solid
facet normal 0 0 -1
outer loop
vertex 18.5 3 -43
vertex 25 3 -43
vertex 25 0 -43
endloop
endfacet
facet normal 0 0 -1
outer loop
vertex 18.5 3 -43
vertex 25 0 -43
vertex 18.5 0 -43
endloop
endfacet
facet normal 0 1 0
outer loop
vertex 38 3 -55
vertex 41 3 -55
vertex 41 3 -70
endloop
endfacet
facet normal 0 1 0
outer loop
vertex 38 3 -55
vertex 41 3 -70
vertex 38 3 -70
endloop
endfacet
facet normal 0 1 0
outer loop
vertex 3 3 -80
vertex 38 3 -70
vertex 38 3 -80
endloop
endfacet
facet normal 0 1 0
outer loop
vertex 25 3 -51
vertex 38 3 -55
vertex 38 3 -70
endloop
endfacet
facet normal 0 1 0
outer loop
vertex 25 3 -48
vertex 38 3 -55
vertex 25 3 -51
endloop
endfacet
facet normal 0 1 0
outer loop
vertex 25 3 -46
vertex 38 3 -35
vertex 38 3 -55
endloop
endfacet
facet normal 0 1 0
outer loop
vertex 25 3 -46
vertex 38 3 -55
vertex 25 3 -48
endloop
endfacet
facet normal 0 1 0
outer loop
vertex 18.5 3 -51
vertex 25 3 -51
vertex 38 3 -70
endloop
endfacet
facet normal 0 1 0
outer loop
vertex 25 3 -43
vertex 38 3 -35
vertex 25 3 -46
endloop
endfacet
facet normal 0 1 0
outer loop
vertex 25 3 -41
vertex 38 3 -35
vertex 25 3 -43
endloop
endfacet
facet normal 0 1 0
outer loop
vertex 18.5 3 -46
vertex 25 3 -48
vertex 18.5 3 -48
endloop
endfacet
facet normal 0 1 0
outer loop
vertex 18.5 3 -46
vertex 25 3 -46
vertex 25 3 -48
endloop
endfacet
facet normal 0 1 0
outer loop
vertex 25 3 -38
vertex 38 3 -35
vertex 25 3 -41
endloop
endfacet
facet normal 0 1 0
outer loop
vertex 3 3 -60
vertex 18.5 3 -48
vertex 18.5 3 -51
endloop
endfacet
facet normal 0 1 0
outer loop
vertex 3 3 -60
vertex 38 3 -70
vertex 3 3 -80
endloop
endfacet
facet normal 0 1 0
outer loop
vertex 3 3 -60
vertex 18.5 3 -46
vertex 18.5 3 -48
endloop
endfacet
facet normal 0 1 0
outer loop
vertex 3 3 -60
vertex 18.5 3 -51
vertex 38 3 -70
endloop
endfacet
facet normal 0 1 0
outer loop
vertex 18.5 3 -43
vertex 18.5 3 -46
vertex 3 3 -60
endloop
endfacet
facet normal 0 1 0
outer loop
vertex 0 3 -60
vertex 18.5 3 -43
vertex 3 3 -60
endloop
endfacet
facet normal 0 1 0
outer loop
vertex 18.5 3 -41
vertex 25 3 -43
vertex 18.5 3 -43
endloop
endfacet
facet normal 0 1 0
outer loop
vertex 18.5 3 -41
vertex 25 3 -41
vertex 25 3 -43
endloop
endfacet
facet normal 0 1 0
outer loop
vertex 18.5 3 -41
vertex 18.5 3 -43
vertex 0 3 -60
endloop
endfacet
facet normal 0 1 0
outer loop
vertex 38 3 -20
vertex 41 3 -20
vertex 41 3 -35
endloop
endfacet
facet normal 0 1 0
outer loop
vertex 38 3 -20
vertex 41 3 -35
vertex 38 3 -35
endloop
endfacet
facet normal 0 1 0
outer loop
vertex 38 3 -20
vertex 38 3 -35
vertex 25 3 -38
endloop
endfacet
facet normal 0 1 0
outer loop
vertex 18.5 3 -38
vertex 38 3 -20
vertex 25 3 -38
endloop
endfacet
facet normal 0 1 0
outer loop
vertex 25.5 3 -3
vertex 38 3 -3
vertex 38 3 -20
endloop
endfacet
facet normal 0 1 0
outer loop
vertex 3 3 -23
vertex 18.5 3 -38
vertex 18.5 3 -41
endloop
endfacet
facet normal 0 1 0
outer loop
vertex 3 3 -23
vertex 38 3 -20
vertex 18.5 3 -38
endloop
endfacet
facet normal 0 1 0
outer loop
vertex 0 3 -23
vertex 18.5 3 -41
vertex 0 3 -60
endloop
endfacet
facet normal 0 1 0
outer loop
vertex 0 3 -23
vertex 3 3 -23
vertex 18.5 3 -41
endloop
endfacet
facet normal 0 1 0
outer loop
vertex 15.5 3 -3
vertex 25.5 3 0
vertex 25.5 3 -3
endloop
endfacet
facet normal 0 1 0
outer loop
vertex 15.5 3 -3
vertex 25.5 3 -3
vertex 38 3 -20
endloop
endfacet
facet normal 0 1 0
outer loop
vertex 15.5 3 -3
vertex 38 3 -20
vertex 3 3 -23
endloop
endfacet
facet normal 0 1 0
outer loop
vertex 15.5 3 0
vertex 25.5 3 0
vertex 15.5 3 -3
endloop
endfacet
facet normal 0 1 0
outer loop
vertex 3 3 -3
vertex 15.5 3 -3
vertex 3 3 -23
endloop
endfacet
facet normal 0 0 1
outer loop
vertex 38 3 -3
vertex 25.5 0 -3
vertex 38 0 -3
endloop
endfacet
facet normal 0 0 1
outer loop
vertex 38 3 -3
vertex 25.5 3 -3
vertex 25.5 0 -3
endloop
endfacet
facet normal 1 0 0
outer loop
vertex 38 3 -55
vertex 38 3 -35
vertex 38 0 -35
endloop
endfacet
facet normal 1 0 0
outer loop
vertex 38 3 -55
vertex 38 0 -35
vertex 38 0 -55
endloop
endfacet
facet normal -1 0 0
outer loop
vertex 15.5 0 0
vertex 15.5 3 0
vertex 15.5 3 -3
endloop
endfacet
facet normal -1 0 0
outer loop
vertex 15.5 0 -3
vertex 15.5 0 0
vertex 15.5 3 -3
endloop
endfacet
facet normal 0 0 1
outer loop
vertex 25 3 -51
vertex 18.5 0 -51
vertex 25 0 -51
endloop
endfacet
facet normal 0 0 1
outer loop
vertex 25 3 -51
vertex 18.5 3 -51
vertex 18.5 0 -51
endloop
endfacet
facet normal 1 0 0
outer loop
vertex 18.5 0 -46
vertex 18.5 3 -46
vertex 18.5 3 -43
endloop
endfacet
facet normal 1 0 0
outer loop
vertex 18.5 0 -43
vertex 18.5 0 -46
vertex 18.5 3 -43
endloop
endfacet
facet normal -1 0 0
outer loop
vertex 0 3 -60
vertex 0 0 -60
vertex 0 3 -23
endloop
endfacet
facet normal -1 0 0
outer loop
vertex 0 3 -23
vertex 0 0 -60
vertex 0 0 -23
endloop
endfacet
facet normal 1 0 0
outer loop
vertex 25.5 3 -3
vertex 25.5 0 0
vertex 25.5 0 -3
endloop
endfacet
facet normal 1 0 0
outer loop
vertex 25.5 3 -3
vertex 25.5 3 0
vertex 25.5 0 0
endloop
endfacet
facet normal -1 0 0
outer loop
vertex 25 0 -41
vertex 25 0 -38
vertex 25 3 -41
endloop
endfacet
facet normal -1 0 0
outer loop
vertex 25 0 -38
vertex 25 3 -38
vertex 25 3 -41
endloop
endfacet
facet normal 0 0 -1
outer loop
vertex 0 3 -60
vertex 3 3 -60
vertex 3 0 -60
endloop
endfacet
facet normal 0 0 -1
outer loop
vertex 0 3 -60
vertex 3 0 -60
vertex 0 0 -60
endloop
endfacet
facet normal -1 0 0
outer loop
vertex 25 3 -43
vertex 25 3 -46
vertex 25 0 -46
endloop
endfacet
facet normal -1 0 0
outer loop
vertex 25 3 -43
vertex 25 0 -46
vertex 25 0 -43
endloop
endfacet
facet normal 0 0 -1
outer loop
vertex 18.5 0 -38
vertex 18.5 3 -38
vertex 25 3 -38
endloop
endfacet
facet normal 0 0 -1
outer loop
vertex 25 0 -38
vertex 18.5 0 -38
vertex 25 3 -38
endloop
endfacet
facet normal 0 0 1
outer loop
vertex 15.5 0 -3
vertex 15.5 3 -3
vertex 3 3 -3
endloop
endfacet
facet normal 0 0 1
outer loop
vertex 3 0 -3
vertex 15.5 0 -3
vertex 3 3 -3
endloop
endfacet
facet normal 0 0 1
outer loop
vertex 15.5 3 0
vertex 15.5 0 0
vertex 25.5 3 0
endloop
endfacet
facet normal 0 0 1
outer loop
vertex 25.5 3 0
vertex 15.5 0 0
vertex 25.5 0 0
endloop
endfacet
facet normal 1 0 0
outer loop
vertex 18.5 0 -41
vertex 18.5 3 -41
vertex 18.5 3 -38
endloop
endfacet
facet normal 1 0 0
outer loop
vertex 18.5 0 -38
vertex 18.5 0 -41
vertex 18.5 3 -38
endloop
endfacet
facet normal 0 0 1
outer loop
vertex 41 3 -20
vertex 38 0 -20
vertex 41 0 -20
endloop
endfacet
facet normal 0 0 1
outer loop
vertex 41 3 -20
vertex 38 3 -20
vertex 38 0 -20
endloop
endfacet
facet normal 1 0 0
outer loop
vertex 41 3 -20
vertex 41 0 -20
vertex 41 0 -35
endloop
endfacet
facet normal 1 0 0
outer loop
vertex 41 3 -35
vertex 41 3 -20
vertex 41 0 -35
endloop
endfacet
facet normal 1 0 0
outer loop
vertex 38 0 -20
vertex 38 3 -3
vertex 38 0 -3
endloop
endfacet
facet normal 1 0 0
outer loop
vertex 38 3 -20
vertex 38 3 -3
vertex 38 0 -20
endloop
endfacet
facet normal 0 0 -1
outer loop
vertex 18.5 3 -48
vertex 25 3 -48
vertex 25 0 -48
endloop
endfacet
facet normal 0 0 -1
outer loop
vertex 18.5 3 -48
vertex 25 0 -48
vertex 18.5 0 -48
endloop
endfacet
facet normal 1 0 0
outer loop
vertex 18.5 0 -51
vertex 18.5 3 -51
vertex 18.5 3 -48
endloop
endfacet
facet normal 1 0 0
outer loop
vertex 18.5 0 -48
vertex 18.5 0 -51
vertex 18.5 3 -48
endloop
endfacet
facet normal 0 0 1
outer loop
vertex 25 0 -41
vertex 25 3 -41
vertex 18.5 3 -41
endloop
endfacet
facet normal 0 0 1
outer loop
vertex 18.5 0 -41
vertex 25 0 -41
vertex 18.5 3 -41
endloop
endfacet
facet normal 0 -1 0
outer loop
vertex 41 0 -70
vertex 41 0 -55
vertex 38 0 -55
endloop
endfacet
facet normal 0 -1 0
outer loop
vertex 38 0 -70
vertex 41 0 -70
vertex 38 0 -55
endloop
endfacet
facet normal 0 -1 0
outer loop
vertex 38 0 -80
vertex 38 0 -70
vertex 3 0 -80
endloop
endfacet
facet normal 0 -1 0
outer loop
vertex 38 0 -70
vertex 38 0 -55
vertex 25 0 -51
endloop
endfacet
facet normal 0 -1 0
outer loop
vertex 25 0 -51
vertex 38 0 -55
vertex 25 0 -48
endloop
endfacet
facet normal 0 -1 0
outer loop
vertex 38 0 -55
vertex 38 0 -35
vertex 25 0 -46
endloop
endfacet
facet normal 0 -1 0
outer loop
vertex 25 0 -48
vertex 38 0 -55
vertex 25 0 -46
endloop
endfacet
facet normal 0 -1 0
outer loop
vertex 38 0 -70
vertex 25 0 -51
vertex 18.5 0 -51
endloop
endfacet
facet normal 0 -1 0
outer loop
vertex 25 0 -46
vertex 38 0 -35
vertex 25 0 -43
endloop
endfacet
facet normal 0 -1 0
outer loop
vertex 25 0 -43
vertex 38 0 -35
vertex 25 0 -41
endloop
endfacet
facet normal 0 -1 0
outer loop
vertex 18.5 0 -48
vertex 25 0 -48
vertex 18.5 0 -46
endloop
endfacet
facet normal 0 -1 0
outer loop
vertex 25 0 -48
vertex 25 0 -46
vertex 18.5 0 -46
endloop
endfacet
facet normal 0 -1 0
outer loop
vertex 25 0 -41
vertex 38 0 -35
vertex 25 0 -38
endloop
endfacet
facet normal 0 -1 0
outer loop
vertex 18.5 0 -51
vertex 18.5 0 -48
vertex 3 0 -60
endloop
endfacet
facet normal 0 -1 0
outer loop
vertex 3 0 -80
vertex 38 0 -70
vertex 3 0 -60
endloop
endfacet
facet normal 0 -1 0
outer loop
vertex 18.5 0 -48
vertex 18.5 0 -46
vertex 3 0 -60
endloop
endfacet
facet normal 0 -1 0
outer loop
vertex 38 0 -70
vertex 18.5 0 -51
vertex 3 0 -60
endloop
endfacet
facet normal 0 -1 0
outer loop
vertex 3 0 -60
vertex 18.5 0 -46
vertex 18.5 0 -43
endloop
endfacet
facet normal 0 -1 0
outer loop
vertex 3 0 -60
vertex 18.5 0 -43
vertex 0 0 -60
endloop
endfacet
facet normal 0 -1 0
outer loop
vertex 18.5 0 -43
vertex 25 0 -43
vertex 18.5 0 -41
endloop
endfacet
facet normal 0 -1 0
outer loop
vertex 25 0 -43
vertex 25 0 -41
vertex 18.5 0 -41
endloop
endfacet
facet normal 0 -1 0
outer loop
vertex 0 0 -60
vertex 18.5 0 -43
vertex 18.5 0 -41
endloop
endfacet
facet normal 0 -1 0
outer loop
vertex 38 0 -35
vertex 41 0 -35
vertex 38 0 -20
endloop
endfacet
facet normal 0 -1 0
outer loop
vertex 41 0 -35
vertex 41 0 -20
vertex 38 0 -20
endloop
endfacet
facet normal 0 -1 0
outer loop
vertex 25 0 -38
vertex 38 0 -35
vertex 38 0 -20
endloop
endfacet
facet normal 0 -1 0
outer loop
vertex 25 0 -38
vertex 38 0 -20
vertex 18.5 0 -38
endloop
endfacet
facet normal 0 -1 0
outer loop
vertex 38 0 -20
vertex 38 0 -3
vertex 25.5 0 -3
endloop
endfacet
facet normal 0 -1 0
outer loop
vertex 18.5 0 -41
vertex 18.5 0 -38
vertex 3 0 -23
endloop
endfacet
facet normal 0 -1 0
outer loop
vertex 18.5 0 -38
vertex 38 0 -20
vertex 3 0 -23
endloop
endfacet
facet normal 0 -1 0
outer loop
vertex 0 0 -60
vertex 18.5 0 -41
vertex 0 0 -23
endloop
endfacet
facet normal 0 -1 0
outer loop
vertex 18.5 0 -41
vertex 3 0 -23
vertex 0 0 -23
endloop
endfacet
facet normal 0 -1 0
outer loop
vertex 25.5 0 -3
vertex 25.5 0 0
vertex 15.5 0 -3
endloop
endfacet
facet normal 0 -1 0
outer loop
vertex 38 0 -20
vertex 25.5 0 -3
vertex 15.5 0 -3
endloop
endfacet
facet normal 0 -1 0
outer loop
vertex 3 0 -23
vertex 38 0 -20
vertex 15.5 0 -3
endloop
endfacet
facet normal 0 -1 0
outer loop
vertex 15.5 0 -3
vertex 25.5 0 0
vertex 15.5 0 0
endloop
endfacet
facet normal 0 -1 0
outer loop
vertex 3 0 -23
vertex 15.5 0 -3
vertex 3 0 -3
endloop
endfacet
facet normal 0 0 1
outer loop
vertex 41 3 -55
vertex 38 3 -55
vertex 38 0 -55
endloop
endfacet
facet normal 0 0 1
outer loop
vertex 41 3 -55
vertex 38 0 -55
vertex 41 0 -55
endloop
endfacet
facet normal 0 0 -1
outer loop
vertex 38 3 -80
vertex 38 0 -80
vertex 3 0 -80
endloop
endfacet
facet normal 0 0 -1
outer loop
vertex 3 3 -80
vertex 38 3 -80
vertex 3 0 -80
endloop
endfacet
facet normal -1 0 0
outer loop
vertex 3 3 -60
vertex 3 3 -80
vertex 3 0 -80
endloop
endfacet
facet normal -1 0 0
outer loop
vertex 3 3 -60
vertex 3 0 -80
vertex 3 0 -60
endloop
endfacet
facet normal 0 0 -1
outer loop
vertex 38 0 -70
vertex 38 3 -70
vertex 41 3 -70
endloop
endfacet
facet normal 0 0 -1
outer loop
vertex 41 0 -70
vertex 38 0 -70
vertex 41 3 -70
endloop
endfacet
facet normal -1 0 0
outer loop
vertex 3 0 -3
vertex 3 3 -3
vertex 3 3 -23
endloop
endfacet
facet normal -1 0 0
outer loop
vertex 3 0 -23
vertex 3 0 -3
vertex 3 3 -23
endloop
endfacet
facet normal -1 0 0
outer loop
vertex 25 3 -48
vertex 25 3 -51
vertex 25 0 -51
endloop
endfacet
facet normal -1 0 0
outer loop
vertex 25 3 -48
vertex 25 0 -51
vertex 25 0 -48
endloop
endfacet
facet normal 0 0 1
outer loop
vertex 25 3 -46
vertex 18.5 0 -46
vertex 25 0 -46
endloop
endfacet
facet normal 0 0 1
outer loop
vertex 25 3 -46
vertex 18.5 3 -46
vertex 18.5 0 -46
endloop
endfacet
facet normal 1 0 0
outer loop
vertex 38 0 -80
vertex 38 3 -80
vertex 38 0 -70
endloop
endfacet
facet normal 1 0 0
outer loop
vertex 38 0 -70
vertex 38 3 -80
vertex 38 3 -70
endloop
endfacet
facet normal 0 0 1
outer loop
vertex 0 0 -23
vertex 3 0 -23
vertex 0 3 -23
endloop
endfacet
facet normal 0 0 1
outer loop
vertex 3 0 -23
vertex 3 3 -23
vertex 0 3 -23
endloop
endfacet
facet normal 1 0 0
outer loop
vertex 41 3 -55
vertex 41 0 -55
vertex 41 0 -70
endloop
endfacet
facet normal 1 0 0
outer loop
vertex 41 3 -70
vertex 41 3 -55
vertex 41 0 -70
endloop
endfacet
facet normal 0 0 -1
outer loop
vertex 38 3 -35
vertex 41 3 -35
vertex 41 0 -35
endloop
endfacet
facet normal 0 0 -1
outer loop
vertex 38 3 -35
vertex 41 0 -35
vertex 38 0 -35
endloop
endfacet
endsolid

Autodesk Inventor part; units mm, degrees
ref_plane "YZ Plane" through (0, 0, 0) normal (1, 0, 0) x (0, 1, 0)
ref_plane "XZ Plane" through (0, 0, 0) normal (0, 1, 0) x (-1, 0, 0)
ref_plane "XY Plane" through (0, 0, 0) normal (0, 0, 1) x (1, 0, 0)
sketch "Sketch1" plane through (0, 0, 0) normal (0, 1, 0) x (-1, 0, 0)
  line L0 (0, 0) -> (-41, 0)
  line L1 (-41, 0) -> (-41, -80)
  line L2 (-41, -80) -> (0, -80)
  line L3 (0, -80) -> (0, 0)
  dimension "d0" = 41
  dimension "d1" = 80
extrude "Extrusion1" add sketch "Sketch1" along normal blind 3
sketch "Sketch2" plane through (0, 3, 0) normal (0, 1, 0) x (1, 0, 0)
  line L0 (0, 0) -> (41, 0) projected
  line L1 (41, 0) -> (25.5, 0)
  line L2 (25.5, 0) -> (25.5, 3)
  line L3 (25.5, 3) -> (41, 3)
  line L4 (41, 3) -> (41, 0)
  line L5 (0, 0) -> (15.5, 0)
  line L6 (15.5, 0) -> (15.5, 3)
  line L7 (15.5, 3) -> (0, 3)
  line L8 (0, 3) -> (0, 0)
  line L9 (0, 3) -> (3, 3)
  line L10 (3, 3) -> (3, 23)
  line L11 (3, 23) -> (0, 23)
  line L12 (0, 23) -> (0, 3)
  line L13 (41, 80) -> (0, 80) projected
  line L14 (0, 80) -> (3, 80)
  line L15 (3, 80) -> (3, 60)
  line L16 (3, 60) -> (0, 60)
  line L17 (0, 60) -> (0, 80)
  line L18 (41, 3) -> (38, 3)
  line L19 (38, 3) -> (38, 20)
  line L20 (38, 20) -> (41, 20)
  line L21 (41, 20) -> (41, 3)
  line L22 (41, 0) -> (41, 80) projected
  line L23 (41, 35) -> (38, 35)
  line L24 (38, 35) -> (38, 55)
  line L25 (38, 55) -> (41, 55)
  line L26 (41, 55) -> (41, 35)
  line L27 (41, 80) -> (38, 80)
  line L28 (38, 80) -> (38, 70)
  line L29 (38, 70) -> (41, 70)
  line L30 (41, 70) -> (41, 80)
  dimension "d4" = 15.5
  dimension "d5" = 3
  dimension "d6" = 3
  dimension "d7" = 10
  dimension "d8" = 3
  dimension "d9" = 20
  dimension "d10" = 3
  dimension "d11" = 20
  dimension "d12" = 3
  dimension "d13" = 17
  dimension "d14" = 3
  dimension "d15" = 20
  dimension "d16" = 15
  dimension "d17" = 3
  dimension "d18" = 15
extrude "Extrusion2" cut sketch "Sketch2" against normal through all
sketch "Sketch3" plane through (0, 3, 0) normal (0, 1, 0) x (1, 0, 0)
  line L0 (0, 51) -> (18.5, 51)
  line L1 (18.5, 51) -> (18.5, 38)
  line L2 (18.5, 38) -> (0, 38)
  line L3 (0, 38) -> (0, 51)
  line L4 (15.5, 0) -> (25.5, 0) projected
  line L5 (18.5, 38) -> (25, 38)
  line L6 (25, 38) -> (25, 41)
  line L7 (25, 41) -> (18.5, 41)
  line L8 (18.5, 41) -> (18.5, 38)
  line L9 (18.5, 51) -> (25, 51)
  line L10 (25, 51) -> (25, 48)
  line L11 (25, 48) -> (18.5, 48)
  line L12 (18.5, 48) -> (18.5, 51)
  line L13 (18.5, 46) -> (25, 46)
  line L14 (25, 46) -> (25, 43)
  line L15 (25, 43) -> (18.5, 43)
  line L16 (18.5, 43) -> (18.5, 46)
  point P0 (0, 0)
  dimension "d21" = 18.5
  dimension "d22" = 13
  dimension "d23" = 38
  dimension "d24" = 6.5
  dimension "d25" = 3
  dimension "d26" = 6.5
  dimension "d27" = 3
  dimension "d28" = 6.5
  dimension "d29" = 3
  dimension "d30" = 2
extrude "Extrusion3" cut sketch "Sketch3" against normal through all contours L9 L10 L11 L1 | L1 L7 L6 L5 | L13 L14 L15 L1
equation "\"d28\" = d24"
equation "\"d29\" = d27"
properties part number "top_right_v2"
